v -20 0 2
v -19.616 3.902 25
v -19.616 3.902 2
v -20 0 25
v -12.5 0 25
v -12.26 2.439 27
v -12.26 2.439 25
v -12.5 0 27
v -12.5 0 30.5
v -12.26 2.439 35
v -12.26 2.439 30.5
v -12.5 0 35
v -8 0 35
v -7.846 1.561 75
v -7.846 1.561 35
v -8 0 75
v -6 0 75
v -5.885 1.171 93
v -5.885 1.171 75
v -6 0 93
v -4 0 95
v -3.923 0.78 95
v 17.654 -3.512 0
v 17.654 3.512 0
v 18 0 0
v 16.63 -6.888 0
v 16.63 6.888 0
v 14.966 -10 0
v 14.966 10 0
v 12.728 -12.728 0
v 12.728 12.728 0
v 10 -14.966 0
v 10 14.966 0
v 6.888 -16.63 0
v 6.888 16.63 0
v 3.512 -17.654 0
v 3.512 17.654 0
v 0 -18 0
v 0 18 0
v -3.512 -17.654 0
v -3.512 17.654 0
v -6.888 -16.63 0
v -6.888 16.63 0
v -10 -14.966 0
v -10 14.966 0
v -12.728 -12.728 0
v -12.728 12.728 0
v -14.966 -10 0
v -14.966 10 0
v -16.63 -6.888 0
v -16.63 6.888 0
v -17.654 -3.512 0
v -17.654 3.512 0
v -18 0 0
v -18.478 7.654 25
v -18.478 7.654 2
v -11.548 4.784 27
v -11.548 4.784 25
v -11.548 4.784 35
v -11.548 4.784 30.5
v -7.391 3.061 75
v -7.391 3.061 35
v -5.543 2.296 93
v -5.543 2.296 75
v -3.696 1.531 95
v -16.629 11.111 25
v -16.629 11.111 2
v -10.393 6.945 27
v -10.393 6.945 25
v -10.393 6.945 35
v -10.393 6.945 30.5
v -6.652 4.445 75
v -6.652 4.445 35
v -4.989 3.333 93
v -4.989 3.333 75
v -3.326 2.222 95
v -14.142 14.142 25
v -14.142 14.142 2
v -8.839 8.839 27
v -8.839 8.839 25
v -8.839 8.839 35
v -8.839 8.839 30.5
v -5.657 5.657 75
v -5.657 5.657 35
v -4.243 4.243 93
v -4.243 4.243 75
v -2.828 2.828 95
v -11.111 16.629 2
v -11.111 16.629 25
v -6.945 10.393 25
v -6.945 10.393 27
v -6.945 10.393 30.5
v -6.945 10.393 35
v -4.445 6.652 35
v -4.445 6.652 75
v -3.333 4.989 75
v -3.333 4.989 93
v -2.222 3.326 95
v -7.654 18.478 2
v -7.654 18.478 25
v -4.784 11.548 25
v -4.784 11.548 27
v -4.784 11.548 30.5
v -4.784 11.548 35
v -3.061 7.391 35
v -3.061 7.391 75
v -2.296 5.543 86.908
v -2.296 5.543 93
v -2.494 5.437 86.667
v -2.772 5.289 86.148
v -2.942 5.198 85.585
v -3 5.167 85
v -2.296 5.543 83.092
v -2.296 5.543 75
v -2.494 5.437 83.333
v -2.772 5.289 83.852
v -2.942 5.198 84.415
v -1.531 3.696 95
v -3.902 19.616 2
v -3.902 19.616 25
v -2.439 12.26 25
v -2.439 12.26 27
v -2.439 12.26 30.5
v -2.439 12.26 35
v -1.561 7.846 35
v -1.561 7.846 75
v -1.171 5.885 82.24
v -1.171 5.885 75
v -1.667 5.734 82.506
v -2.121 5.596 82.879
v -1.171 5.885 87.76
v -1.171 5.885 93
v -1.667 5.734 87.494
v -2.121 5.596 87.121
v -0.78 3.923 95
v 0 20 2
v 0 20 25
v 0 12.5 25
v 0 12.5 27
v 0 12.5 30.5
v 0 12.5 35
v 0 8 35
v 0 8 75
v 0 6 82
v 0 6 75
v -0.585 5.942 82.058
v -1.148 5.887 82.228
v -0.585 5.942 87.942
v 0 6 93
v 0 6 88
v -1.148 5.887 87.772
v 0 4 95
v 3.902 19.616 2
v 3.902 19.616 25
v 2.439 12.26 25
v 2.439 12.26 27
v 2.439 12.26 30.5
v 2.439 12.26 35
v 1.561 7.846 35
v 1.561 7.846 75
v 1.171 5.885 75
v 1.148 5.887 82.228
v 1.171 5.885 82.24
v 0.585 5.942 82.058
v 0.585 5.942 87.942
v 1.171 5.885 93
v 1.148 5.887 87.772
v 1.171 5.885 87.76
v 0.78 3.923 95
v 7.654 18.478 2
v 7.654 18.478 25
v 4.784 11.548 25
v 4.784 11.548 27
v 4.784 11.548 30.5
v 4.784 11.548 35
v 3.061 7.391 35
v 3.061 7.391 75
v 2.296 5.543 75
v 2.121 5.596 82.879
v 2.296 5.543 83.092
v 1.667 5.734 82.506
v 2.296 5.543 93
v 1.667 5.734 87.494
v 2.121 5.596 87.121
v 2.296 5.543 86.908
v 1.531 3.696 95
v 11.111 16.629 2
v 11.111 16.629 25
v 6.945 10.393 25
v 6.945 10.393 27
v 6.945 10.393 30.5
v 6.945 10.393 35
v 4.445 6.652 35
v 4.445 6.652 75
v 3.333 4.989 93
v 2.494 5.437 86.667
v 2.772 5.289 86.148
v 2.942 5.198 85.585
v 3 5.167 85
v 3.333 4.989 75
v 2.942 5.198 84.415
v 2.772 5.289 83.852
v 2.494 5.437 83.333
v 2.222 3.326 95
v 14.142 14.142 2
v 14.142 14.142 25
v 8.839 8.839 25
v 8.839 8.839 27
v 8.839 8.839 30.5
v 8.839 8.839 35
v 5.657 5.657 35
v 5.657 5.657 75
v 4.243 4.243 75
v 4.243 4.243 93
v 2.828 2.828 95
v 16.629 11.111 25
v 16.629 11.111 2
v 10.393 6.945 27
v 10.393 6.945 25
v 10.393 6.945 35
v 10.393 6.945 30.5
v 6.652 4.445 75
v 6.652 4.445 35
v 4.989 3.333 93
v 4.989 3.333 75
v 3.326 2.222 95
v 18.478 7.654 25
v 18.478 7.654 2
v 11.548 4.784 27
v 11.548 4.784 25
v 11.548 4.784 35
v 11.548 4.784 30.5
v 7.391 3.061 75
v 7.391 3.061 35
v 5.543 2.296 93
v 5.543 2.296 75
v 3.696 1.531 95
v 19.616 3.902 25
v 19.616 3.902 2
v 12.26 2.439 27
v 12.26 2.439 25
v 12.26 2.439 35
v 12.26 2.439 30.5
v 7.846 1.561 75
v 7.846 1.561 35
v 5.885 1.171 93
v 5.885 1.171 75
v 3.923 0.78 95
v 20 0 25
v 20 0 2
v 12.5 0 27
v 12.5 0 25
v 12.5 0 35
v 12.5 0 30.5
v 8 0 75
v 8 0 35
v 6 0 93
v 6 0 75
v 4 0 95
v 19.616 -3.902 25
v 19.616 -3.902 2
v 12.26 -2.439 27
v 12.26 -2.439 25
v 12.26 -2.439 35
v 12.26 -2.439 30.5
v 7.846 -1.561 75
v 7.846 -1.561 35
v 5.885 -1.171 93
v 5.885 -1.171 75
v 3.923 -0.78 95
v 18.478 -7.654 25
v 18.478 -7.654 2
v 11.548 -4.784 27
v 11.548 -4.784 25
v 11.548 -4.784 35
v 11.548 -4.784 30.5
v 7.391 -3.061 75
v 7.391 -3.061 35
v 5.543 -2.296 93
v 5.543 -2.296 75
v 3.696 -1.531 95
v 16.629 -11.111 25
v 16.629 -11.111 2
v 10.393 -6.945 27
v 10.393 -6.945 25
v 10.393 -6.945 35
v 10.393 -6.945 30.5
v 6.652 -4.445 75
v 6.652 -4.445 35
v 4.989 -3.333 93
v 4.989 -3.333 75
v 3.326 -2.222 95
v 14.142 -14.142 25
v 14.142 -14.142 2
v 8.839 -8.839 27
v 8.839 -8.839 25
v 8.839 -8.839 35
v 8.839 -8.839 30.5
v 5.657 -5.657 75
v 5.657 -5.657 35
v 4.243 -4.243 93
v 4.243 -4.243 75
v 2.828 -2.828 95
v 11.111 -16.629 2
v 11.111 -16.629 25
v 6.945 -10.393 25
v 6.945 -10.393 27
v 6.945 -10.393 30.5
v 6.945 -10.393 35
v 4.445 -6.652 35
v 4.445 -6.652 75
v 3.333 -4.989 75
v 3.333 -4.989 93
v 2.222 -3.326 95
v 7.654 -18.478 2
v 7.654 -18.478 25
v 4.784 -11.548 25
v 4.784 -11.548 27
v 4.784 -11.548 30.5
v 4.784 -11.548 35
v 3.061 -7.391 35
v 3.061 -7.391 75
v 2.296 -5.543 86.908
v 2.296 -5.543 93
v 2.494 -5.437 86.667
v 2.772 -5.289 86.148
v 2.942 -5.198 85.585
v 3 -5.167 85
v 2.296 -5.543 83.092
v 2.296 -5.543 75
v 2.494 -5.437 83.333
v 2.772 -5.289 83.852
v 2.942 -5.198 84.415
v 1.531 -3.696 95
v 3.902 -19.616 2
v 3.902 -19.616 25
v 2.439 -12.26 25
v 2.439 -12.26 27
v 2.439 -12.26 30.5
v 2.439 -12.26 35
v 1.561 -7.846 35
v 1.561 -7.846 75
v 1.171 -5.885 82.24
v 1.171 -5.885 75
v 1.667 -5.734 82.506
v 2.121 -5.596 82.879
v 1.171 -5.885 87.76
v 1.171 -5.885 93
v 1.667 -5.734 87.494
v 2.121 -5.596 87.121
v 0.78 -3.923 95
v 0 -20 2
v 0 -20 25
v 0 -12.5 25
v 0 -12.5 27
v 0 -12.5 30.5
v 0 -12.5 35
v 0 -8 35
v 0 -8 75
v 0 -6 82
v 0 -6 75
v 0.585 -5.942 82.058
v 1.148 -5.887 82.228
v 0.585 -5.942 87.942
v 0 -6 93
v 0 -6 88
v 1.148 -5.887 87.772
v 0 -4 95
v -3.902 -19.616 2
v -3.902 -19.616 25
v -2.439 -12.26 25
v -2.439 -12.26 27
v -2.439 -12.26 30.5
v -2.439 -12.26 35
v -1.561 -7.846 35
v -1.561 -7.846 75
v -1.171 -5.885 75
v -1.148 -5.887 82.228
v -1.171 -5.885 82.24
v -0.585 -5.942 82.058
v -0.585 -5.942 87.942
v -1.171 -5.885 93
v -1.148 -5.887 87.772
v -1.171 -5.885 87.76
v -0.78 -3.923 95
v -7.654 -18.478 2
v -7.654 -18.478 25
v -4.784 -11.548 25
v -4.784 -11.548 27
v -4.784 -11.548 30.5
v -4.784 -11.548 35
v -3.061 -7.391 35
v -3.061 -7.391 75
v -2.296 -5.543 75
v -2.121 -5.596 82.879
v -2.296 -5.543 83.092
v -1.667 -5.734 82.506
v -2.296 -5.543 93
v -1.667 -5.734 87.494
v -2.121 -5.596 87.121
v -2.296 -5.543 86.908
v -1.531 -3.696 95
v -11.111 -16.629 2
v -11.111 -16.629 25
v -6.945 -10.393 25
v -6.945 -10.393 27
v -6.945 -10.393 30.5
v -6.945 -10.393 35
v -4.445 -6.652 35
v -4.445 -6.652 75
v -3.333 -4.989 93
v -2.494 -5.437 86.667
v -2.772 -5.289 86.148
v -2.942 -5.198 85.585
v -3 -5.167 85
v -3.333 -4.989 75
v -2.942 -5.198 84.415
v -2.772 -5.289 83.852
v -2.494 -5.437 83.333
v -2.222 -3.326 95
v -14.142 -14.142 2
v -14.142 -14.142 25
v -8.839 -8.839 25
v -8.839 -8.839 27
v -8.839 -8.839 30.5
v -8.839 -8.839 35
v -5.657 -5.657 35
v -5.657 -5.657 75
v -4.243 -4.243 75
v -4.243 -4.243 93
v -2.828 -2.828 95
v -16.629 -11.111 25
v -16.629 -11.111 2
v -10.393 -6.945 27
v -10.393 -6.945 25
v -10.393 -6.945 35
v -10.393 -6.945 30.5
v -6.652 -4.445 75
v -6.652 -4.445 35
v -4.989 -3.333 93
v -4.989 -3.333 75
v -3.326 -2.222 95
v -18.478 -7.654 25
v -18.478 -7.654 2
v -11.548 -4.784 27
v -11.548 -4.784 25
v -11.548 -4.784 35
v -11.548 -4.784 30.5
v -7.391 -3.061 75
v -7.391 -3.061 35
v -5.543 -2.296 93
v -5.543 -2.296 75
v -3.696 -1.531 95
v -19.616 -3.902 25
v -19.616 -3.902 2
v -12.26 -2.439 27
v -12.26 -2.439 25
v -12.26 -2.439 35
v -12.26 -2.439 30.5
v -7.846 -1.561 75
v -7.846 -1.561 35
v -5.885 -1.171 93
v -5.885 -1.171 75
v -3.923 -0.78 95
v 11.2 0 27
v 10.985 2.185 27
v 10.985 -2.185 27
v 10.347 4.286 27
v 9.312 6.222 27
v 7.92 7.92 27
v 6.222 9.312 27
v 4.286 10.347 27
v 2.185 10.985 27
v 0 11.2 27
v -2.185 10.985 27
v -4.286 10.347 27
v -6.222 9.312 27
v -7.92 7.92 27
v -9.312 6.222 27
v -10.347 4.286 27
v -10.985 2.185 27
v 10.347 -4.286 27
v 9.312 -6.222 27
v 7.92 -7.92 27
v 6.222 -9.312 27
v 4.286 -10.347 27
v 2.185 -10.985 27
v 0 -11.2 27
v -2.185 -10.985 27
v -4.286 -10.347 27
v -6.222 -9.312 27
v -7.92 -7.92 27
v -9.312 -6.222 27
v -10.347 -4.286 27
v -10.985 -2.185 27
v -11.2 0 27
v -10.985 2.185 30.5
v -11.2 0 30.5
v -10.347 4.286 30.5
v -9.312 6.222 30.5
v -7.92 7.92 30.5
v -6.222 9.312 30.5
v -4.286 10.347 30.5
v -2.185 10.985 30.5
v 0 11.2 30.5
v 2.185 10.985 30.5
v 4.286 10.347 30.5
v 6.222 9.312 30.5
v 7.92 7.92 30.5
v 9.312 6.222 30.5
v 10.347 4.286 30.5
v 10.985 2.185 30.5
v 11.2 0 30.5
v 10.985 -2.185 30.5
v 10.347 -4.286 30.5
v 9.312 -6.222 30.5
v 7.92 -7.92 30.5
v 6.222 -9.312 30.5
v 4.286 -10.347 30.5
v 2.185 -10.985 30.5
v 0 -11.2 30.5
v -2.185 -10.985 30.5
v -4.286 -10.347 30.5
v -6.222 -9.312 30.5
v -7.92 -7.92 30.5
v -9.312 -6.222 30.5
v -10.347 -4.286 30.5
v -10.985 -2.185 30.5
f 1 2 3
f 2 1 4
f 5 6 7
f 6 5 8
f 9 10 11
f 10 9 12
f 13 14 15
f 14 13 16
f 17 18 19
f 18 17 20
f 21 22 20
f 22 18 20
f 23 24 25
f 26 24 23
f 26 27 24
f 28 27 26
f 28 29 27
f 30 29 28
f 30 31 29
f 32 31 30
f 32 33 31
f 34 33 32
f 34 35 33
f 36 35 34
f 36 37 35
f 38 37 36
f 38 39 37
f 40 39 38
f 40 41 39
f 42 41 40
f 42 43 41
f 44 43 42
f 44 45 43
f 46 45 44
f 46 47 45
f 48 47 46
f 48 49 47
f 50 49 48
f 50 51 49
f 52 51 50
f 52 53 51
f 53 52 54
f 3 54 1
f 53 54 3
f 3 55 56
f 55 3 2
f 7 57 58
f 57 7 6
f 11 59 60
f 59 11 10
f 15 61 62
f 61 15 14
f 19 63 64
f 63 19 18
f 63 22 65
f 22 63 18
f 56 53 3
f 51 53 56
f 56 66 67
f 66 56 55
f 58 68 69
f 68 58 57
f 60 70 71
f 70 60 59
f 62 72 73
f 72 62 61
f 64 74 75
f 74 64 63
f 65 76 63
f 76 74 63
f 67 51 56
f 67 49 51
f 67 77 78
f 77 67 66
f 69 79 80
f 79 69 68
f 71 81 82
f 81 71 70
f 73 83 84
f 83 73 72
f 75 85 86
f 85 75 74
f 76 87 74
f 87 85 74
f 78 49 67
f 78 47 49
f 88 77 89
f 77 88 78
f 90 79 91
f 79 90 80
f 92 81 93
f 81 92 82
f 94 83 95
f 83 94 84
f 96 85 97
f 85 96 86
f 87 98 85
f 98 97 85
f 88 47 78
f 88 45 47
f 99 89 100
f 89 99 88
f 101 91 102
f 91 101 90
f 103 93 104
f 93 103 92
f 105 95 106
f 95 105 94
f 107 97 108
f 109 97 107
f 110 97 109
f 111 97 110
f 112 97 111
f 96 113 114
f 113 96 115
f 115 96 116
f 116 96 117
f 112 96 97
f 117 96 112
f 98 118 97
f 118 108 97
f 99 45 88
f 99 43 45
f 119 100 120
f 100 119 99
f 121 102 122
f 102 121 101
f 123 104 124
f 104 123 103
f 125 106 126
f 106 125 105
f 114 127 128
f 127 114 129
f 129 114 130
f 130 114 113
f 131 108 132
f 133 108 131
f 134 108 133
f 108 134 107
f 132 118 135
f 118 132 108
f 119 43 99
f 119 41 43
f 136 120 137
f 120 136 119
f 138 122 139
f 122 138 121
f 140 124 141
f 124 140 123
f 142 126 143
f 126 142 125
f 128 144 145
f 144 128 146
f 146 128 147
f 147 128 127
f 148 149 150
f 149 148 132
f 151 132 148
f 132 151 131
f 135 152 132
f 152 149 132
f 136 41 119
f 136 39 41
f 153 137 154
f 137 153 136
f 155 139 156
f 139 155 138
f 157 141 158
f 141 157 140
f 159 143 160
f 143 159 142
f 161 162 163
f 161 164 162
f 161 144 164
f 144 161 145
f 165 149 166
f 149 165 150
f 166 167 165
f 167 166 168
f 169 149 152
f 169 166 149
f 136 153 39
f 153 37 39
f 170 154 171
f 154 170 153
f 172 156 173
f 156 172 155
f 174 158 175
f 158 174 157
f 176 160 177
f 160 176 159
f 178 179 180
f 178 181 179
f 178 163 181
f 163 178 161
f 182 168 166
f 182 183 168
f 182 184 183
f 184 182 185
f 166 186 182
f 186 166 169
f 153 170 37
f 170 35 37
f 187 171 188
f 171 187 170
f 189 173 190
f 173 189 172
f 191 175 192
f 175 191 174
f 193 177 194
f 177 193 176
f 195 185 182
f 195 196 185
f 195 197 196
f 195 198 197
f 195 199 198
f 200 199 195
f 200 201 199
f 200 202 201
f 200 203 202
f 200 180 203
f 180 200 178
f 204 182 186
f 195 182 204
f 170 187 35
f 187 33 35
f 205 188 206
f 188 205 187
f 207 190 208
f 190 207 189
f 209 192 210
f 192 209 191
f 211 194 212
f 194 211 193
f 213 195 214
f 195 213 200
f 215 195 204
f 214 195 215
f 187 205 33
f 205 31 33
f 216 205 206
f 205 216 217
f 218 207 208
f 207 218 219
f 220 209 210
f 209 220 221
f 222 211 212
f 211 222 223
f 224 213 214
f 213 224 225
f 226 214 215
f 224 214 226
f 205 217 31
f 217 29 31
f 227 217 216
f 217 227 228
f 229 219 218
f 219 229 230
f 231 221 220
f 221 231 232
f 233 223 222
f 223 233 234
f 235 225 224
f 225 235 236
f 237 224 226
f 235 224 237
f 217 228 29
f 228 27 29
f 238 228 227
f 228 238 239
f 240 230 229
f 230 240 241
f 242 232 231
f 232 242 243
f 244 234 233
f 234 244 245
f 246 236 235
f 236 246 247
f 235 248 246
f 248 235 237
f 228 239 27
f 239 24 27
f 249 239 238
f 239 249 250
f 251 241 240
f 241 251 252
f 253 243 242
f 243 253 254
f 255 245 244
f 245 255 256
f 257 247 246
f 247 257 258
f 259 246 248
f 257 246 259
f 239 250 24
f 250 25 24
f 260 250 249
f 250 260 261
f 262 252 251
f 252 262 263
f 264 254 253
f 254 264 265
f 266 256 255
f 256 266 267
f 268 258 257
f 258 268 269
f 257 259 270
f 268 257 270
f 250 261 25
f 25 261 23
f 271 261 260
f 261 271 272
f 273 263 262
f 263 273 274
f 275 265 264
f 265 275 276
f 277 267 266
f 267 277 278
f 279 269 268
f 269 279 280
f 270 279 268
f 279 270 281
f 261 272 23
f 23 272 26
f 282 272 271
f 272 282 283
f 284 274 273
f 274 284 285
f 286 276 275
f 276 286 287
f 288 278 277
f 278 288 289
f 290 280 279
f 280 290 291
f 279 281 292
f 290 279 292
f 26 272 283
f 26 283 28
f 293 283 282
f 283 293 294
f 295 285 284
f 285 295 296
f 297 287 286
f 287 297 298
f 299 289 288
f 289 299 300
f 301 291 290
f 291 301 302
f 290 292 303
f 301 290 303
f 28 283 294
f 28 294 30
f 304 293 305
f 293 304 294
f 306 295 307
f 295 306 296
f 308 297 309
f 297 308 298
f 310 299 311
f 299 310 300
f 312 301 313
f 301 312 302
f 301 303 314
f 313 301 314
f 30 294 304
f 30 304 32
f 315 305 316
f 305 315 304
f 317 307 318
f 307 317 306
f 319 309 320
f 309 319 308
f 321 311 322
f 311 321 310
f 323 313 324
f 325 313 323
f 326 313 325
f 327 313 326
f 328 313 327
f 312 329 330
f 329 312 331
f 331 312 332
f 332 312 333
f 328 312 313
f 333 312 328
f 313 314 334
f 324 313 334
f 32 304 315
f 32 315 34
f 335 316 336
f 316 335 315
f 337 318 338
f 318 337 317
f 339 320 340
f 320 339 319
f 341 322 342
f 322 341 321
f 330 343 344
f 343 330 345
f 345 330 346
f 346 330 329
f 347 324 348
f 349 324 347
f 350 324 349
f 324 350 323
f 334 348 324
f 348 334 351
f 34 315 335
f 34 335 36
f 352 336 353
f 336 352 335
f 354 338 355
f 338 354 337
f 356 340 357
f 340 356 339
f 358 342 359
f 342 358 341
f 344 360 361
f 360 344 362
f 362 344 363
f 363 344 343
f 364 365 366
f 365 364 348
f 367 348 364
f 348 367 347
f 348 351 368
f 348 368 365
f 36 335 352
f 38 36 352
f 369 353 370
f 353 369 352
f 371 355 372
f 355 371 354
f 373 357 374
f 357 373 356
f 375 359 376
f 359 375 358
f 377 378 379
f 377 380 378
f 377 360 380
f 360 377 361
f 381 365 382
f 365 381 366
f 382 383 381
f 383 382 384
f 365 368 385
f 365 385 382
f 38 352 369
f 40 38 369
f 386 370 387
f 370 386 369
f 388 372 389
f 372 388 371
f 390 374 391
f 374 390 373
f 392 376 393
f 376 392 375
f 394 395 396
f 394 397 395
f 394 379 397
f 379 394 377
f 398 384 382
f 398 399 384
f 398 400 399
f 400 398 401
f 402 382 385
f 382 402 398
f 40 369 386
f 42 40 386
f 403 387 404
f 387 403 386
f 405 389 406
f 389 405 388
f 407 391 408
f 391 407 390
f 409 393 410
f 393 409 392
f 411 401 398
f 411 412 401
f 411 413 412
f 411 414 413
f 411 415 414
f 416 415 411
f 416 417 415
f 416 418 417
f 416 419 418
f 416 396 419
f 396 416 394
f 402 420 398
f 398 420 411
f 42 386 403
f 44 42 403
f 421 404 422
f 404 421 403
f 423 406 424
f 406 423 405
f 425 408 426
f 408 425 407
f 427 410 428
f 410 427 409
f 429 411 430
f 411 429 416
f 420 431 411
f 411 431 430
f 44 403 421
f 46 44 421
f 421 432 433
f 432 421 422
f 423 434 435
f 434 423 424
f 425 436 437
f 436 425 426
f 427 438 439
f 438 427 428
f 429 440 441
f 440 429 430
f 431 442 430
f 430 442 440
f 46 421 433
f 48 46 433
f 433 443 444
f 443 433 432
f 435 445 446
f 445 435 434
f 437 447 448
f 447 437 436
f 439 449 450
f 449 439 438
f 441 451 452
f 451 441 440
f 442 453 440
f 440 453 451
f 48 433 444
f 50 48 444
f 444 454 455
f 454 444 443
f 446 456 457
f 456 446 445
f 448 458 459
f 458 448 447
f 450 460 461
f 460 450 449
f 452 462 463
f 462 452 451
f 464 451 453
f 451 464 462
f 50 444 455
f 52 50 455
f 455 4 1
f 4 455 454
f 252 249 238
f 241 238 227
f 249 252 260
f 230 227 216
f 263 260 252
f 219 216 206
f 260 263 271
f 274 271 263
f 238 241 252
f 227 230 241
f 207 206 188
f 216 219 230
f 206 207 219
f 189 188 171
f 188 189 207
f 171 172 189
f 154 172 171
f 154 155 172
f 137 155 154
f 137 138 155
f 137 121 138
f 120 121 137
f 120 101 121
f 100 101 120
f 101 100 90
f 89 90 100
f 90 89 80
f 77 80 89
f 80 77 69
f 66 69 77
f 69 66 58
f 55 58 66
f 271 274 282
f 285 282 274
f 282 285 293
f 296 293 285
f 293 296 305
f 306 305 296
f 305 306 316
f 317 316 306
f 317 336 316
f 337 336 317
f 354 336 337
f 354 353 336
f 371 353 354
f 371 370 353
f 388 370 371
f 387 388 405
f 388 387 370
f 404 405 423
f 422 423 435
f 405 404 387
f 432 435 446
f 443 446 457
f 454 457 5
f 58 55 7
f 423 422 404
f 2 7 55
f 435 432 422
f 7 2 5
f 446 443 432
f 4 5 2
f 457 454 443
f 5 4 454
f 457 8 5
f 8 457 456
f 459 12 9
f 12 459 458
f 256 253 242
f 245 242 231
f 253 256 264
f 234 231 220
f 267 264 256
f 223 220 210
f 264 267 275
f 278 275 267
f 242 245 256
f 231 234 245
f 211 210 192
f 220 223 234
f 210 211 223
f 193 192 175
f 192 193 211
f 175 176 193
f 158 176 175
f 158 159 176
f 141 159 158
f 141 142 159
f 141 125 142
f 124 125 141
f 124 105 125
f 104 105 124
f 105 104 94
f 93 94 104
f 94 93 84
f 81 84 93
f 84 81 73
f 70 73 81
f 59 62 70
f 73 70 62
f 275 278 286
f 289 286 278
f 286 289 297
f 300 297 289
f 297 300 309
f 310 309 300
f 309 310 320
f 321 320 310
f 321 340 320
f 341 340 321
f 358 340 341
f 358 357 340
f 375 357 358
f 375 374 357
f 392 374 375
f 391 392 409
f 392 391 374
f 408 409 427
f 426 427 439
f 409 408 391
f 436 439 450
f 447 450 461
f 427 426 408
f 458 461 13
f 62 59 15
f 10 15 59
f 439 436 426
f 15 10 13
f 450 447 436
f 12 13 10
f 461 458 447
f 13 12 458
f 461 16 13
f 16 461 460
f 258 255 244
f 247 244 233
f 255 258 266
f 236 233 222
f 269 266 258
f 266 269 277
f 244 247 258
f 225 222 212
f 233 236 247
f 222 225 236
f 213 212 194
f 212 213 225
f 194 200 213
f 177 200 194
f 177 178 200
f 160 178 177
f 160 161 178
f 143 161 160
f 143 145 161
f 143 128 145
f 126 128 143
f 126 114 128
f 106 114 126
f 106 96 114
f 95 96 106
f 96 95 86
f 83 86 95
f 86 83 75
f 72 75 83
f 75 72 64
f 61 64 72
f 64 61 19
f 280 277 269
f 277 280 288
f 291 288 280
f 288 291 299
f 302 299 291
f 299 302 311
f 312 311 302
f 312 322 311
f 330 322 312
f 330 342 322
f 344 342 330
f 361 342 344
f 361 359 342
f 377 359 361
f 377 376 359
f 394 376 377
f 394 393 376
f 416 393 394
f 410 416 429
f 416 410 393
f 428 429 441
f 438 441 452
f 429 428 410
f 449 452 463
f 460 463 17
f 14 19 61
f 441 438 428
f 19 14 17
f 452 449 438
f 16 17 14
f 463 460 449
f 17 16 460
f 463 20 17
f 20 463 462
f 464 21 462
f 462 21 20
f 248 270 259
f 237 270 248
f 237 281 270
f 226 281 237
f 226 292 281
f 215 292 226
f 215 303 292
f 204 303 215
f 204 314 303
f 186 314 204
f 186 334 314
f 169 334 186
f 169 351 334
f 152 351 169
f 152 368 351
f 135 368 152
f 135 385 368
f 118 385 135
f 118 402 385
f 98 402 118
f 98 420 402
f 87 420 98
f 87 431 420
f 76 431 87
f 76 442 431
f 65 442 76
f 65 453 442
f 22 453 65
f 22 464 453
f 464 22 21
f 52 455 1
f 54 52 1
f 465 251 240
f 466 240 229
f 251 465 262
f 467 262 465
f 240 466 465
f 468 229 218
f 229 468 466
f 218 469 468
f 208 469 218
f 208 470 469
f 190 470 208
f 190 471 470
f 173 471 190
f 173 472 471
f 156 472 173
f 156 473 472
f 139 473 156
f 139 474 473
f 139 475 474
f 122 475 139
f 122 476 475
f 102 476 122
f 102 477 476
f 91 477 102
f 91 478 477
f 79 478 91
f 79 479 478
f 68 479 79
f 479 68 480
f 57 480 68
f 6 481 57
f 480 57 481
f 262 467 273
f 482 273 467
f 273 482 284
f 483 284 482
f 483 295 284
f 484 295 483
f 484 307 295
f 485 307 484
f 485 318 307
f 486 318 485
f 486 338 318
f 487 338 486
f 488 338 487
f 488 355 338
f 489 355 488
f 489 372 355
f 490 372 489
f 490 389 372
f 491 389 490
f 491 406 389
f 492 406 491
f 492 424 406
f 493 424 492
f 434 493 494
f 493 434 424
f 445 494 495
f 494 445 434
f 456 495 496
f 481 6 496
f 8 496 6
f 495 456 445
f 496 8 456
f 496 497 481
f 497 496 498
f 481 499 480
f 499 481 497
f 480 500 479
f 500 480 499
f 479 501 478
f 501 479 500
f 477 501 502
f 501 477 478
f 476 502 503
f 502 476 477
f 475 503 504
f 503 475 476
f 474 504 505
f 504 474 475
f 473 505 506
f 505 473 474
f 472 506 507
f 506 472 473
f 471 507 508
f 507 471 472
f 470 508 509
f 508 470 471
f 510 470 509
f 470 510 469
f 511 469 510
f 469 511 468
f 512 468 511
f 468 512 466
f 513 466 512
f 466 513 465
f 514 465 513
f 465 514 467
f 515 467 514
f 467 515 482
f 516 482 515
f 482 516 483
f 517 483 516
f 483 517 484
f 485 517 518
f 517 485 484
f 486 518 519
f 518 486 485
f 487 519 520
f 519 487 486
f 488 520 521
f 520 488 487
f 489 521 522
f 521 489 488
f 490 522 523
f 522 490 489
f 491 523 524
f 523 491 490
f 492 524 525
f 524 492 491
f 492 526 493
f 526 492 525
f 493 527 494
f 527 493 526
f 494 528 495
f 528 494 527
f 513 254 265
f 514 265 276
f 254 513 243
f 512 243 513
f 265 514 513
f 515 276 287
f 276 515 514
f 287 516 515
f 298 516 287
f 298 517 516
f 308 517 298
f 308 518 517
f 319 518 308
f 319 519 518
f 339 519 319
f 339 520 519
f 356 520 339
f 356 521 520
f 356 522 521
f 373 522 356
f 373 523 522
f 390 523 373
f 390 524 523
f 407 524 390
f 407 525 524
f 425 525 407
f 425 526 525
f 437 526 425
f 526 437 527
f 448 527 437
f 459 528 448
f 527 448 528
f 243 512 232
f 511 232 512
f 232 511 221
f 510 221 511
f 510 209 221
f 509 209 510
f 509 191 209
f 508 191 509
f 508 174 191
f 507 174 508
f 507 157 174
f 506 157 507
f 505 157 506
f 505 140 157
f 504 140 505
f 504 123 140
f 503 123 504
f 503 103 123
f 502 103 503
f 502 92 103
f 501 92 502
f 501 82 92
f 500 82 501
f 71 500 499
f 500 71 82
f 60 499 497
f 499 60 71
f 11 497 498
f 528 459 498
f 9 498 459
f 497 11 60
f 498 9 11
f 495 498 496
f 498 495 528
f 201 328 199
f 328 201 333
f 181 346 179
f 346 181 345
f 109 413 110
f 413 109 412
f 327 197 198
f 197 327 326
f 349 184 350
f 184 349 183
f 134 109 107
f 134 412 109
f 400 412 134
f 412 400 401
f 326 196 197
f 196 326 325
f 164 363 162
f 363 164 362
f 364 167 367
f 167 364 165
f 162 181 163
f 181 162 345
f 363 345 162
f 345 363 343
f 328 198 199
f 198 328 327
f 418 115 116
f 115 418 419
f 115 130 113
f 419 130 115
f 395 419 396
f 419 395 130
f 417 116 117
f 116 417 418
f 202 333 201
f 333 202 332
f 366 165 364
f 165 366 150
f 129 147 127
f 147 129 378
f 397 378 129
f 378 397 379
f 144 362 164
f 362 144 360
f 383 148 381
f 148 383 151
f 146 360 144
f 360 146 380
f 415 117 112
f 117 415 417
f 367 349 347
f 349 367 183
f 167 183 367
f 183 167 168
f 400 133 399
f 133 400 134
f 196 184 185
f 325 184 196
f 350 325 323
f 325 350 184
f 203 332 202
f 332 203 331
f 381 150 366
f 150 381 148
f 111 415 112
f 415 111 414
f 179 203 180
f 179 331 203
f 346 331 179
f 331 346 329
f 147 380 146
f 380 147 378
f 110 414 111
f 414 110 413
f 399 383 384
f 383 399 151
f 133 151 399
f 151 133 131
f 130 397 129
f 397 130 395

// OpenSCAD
$fn = 32;

// ----------------------------------------------------------------------
// Stepped shaft: diameters 40, 25, 16, 12 mm, 95 mm long
// ----------------------------------------------------------------------

// --- parameters (mm) ---
d1 = 40;                  // step 1 diameter
len1 = 25;                // step 1 length
d2 = 25;                  // step 2 diameter
len2 = 10;                // step 2 length
d3 = 16;                  // step 3 diameter
len3 = 40;                // step 3 length
d4 = 12;                  // step 4 diameter
len4 = 20;                // step 4 length
total = 95;               // overall length
chamfer = 2;              // end chamfer
groove_r = 12.5;          // groove radius
groove_z = 27;            // groove position from the end
groove_w = 3.5;           // groove width
groove_d = 1.3;           // groove depth
cross_d = 6;              // cross pin hole
cross_z = 85;             // cross hole position

/* closed turning profile: x is the radius, y is the length */
profile = [[0, 0], [20 - chamfer, 0], [20, chamfer], [20, 25], [12.5, 25], [12.5, 35], [8, 35], [8, 75], [6, 75], [6, 93], [4, 95], [0, 95]];

difference() {
  rotate_extrude() polygon(profile);
  /* circlip groove just behind the shoulder */
  rotate_extrude() translate([groove_r - groove_d, groove_z]) square([groove_d + 1, groove_w]);
  /* cross pin hole through the small step */
  translate([0, 0, cross_z]) rotate([90, 0, 0]) cylinder(h = d4 + 4, d = cross_d, center = true);
}
